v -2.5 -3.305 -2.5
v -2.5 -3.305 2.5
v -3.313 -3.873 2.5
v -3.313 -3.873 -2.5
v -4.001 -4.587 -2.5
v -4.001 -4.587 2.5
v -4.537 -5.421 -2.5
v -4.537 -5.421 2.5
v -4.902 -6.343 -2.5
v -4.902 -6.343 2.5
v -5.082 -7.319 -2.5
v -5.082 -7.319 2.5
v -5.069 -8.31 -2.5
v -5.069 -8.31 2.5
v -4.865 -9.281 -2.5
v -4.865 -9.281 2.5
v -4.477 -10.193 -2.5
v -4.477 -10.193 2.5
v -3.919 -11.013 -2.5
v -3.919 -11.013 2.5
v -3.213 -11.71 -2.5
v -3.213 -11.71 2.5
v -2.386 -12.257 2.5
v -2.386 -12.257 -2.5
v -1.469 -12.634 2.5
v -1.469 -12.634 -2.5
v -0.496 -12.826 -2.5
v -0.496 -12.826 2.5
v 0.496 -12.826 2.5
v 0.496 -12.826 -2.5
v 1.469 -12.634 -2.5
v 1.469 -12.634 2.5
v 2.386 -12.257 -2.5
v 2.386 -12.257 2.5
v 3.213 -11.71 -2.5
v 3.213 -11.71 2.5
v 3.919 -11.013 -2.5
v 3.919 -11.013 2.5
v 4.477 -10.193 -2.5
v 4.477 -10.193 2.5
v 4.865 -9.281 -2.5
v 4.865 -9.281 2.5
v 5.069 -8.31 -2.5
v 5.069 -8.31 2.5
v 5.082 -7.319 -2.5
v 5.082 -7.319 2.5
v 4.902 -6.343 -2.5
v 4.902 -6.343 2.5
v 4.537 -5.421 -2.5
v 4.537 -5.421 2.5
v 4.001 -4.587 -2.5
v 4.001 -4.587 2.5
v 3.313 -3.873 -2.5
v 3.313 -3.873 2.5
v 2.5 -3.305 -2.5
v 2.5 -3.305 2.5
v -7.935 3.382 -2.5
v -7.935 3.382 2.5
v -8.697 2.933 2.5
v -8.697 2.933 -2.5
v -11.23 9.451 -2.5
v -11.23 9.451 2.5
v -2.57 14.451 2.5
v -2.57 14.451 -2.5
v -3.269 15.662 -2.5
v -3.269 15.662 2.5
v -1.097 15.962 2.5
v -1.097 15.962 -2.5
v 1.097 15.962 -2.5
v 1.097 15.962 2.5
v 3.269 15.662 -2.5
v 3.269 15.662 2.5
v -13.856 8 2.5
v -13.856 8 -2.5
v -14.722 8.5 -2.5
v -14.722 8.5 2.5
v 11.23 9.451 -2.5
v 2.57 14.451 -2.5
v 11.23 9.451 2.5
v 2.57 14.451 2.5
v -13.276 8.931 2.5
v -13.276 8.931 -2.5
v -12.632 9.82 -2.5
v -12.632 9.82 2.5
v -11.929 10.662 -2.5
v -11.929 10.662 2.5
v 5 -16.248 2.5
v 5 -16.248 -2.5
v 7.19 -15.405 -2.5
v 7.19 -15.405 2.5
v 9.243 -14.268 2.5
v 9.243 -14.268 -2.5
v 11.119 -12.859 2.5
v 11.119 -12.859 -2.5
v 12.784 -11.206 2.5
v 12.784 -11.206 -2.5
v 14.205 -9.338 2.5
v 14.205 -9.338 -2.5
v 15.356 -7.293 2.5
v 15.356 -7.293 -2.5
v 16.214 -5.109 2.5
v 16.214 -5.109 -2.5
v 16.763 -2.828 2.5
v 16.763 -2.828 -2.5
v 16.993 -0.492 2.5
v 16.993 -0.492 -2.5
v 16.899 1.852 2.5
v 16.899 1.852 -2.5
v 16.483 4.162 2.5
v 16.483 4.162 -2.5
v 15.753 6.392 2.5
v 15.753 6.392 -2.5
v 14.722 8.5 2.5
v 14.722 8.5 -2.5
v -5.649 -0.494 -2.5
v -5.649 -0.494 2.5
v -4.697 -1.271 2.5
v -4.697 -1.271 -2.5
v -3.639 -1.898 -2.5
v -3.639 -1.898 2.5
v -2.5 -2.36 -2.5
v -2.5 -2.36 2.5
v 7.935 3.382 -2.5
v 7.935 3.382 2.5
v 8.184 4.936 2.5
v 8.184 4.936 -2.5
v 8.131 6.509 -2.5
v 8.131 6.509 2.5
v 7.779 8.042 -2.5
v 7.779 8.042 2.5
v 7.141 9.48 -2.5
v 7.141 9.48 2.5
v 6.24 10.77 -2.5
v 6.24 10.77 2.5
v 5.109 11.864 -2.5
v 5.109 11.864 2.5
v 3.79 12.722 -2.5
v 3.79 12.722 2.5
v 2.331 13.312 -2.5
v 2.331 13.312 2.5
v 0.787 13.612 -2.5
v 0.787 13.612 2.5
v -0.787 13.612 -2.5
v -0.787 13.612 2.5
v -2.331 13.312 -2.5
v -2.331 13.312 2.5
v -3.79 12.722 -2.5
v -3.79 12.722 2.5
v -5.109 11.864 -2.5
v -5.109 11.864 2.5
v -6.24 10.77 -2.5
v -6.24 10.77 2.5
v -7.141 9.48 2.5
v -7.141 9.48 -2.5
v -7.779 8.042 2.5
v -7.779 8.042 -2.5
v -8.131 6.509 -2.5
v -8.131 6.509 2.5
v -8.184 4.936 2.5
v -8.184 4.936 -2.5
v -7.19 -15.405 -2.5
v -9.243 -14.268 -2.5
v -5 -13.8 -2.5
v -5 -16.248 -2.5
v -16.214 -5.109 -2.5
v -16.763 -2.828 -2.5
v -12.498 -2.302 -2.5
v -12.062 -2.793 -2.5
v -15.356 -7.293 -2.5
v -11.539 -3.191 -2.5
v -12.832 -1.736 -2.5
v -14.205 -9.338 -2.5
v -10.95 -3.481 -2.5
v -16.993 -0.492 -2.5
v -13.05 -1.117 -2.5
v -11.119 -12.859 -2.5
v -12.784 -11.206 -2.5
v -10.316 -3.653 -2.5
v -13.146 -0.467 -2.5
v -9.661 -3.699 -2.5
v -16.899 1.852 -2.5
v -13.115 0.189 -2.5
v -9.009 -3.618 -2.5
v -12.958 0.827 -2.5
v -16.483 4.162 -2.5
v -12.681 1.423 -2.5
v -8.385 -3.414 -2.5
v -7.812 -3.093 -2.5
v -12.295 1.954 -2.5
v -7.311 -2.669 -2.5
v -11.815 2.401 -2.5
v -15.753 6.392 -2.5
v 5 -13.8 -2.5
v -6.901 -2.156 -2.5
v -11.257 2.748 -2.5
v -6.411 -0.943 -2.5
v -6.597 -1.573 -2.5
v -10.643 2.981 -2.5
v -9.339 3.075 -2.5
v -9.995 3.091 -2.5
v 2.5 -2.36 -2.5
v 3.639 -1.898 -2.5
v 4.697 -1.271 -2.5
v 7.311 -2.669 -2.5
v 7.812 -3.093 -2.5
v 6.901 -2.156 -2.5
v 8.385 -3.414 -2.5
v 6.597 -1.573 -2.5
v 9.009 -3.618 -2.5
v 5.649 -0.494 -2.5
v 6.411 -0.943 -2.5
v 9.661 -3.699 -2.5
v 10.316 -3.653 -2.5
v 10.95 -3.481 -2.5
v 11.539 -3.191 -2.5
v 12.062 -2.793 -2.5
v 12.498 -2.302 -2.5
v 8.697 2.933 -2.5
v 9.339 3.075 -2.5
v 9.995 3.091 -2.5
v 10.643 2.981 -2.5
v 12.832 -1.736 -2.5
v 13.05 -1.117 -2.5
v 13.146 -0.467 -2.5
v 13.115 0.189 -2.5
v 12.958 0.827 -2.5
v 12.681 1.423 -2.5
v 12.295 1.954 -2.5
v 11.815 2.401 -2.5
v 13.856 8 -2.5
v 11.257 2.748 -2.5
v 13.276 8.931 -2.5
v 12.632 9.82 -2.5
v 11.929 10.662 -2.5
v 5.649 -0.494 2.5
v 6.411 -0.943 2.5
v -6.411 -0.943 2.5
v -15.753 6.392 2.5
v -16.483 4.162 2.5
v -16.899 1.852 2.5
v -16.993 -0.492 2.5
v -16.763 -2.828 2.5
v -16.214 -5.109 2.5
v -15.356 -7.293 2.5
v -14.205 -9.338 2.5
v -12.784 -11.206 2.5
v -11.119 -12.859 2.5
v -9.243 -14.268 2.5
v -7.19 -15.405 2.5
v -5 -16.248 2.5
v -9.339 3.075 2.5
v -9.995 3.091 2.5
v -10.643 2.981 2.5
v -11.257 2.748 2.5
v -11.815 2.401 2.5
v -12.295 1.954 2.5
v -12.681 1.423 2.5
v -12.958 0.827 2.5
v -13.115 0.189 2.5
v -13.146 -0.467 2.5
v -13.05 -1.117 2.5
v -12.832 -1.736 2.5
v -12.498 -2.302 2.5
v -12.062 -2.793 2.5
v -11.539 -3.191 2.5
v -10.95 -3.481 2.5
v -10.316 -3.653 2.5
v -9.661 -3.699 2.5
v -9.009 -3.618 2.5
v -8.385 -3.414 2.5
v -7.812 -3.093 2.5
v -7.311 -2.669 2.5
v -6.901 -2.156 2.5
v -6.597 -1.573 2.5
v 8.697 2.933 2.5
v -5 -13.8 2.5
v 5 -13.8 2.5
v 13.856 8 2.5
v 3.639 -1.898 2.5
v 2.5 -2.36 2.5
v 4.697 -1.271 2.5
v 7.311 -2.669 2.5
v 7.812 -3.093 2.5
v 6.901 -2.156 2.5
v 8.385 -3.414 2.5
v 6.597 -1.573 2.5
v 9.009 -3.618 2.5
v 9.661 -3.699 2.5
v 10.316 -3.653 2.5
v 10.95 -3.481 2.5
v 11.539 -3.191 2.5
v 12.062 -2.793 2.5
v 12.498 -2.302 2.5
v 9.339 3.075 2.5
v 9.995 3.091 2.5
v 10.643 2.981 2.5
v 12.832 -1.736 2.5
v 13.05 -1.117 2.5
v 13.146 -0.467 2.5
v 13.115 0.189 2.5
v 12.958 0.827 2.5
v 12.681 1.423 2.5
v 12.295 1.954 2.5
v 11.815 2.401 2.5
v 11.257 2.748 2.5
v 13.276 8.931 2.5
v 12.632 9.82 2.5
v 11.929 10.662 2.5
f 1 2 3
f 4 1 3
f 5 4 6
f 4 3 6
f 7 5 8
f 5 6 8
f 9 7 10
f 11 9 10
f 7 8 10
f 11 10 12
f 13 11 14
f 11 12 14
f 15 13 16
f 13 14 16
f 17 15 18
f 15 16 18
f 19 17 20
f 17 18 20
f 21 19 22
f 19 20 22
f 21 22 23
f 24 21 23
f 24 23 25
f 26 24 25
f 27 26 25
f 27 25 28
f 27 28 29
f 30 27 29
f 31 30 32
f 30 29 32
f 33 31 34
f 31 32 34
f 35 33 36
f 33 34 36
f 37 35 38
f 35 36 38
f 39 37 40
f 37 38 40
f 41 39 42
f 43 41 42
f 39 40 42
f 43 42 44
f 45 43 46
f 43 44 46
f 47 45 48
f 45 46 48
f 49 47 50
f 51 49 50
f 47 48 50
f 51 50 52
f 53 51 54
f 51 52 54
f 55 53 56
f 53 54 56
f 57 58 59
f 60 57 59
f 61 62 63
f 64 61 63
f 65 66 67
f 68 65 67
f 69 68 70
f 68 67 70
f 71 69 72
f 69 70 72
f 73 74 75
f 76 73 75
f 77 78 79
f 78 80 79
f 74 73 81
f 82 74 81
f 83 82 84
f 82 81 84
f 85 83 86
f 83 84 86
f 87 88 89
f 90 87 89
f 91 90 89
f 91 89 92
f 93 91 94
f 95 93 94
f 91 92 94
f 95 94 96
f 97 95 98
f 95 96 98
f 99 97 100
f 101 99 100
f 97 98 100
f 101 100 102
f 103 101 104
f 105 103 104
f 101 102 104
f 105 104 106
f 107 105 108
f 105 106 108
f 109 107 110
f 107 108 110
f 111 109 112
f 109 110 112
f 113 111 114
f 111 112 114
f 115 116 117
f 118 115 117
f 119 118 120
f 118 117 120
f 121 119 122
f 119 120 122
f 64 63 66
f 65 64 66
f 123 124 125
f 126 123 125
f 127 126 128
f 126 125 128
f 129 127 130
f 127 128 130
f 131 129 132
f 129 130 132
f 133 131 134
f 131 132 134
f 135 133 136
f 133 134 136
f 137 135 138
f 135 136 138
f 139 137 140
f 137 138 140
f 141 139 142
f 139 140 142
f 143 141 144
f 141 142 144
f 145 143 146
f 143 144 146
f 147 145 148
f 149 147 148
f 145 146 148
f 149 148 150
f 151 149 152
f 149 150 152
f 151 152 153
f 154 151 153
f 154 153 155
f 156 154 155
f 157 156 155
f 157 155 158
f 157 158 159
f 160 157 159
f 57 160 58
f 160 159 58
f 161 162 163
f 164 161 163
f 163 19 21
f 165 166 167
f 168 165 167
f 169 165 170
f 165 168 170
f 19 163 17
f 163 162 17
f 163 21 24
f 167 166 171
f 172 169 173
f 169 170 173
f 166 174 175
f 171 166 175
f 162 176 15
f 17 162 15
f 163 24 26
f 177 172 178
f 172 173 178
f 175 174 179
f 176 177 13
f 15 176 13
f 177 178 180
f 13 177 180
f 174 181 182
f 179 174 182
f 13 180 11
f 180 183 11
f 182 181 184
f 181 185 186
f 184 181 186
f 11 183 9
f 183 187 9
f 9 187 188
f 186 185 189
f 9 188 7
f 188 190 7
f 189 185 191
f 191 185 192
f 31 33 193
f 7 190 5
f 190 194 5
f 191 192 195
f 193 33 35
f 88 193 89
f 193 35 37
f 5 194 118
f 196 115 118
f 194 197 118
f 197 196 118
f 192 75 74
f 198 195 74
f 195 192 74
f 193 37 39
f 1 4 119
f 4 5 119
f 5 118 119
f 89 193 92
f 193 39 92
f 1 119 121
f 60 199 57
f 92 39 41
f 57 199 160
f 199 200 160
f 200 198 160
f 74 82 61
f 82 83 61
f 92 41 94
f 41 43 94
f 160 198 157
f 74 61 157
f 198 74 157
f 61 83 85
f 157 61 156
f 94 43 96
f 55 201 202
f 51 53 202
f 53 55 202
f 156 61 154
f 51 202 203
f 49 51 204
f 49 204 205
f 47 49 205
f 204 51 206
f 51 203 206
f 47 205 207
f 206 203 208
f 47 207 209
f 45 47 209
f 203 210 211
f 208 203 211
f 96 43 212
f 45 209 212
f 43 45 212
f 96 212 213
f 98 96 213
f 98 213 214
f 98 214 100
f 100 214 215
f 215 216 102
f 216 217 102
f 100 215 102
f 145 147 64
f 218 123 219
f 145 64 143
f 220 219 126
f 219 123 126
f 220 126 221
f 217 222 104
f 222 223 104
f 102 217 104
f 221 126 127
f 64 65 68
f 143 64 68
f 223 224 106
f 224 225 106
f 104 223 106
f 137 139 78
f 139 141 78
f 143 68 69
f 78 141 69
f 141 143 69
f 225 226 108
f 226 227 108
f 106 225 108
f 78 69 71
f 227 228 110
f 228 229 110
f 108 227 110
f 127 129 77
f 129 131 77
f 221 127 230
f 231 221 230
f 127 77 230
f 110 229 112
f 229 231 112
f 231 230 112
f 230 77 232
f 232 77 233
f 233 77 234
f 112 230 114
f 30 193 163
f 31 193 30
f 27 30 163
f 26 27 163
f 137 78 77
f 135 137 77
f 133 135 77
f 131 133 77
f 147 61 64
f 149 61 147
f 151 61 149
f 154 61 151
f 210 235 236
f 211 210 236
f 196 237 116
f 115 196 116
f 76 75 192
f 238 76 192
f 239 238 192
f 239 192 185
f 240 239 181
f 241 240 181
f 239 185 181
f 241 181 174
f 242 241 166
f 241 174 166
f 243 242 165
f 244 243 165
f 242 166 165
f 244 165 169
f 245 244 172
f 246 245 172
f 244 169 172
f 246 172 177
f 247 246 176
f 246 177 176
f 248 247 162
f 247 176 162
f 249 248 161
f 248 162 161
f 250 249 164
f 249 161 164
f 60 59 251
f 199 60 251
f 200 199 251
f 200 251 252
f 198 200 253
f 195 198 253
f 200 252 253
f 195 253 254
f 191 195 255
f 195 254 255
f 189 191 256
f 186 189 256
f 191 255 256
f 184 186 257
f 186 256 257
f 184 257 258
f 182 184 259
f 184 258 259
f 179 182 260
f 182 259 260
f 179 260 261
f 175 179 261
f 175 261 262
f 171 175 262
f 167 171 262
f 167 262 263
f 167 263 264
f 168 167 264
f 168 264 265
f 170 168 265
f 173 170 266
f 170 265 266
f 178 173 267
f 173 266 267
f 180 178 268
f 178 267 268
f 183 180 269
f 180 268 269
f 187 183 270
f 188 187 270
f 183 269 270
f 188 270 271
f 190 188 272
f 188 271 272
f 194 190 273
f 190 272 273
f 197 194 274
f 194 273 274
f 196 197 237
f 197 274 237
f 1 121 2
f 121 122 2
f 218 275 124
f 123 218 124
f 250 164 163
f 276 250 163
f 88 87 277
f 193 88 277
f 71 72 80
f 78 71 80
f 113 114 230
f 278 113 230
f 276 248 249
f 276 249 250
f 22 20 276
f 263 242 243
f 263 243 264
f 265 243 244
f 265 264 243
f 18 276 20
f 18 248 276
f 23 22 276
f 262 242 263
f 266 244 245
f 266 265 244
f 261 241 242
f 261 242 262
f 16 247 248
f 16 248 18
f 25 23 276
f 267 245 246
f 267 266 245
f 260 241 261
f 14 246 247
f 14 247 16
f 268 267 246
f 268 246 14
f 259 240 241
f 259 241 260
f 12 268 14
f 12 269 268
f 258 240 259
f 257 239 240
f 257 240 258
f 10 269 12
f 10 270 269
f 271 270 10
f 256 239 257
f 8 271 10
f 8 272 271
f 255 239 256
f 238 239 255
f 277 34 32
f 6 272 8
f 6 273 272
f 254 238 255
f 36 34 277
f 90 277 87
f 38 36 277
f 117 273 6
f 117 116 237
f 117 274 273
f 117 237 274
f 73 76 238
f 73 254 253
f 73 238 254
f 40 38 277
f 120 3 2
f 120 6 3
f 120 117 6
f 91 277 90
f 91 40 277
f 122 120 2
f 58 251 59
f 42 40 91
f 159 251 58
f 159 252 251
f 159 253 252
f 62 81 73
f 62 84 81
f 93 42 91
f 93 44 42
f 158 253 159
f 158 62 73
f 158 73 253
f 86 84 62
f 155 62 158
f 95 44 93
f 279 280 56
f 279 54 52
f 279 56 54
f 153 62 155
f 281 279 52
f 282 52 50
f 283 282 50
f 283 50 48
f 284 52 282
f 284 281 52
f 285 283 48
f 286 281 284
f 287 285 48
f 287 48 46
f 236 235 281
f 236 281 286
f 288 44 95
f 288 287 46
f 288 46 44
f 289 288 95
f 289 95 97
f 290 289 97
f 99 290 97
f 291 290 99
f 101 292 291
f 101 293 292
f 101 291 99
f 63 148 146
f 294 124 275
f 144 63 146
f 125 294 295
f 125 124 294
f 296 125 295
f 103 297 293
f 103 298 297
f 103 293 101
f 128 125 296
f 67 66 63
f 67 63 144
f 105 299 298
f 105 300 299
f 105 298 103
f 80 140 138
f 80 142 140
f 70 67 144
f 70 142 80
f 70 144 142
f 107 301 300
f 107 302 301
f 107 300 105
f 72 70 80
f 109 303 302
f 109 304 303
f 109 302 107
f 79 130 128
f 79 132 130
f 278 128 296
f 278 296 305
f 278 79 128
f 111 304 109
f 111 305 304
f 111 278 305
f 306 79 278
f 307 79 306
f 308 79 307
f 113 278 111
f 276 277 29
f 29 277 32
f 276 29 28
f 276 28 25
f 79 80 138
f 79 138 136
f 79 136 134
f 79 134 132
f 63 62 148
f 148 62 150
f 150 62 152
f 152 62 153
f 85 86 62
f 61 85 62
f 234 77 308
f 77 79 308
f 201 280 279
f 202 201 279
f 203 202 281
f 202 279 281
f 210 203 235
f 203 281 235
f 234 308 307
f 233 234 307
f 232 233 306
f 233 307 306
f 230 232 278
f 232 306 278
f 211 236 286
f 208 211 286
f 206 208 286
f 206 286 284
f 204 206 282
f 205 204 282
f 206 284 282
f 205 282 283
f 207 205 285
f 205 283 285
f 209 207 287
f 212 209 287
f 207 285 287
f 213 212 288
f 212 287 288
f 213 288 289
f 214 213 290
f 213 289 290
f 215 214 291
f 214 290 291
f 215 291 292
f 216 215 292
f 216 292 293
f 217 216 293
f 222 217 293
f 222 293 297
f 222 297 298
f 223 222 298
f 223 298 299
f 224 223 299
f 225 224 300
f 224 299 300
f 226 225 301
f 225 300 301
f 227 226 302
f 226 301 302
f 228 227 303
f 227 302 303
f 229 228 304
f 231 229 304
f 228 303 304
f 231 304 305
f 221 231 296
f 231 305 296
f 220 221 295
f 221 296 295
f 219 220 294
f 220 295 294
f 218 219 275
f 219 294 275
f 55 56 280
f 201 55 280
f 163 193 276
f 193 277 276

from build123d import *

# Parameters (mm, degrees)
EXTRUDE_1_DEPTH     = 2.5
BOSS_EXTRUDE3_START = -2.5
BOSS_EXTRUDE3_DEPTH = 5


with BuildPart() as part:
    # Эскиз1 → Бобышка-Вытянуть1 (new, symmetric)
    with BuildSketch(Plane.XY):
        with BuildLine():
            Line((3.269215058, 15.662446581), (2.569872981, 14.451150572))
            Line((2.569872981, 14.451150572), (11.230127019, 9.451150572))
            Line((11.230127019, 9.451150572), (11.929469096, 10.662446581))
            ThreePointArc((11.929469096, 10.662446581), (15.454813221, -4.141104722), (5, -15.198684154))
            Line((5, -15.198684154), (5, -13.8))
            Line((5, -13.8), (0, -13.8))
            Line((0, -13.8), (-5, -13.8))
            Line((-5, -13.8), (-5, -15.198684154))
            ThreePointArc((-5, -15.198684154), (-15.454813221, -4.141104722), (-11.929469096, 10.662446581))
            Line((-11.929469096, 10.662446581), (-11.230127019, 9.451150572))
            Line((-11.230127019, 9.451150572), (-2.569872981, 14.451150572))
            Line((-2.569872981, 14.451150572), (-3.269215058, 15.662446581))
            ThreePointArc((-3.269215058, 15.662446581), (0, 16), (3.269215058, 15.662446581))
        make_face()
        with BuildLine():
            Line((-2.5, -2.359609465), (-2.5, -3.304777846))
            ThreePointArc((-2.5, -3.304777846), (0, -12.85), (2.5, -3.304777846))
            Line((2.5, -3.304777846), (2.5, -2.359609465))
            ThreePointArc((2.5, -2.359609465), (4.180016715, -1.604605606), (5.649137352, -0.493672869))
            Line((5.649137352, -0.493672869), (6.41139529, -0.943209602))
            ThreePointArc((6.41139529, -0.943209602), (12.678644072, -2.027149068), (8.69732788, 2.932936963))
            Line((8.69732788, 2.932936963), (7.935069942, 3.382473696))
            ThreePointArc((7.935069942, 3.382473696), (0, 13.65), (-7.935069942, 3.382473696))
            Line((-7.935069942, 3.382473696), (-8.69732788, 2.932936963))
            ThreePointArc((-8.69732788, 2.932936963), (-12.678644072, -2.027149068), (-6.41139529, -0.943209602))
            Line((-6.41139529, -0.943209602), (-5.649137352, -0.493672869))
            ThreePointArc((-5.649137352, -0.493672869), (-4.180016715, -1.604605606), (-2.5, -2.359609465))
        make_face(mode=Mode.SUBTRACT)
    extrude(amount=EXTRUDE_1_DEPTH, both=True)

    # Sketch2 → Boss-Extrude3 (add)
    with BuildSketch(Plane.XY.offset(BOSS_EXTRUDE3_START)):
        with BuildLine():
            ThreePointArc((-5, -15.198684154), (-14.947767484, -5.706509199), (-13.856406461, 8))
            Line((-13.856406461, 8), (-14.722431864, 8.5))
            ThreePointArc((-14.722431864, 8.5), (-15.822781238, -6.216075442), (-5, -16.248076809))
            Line((-5, -16.248076809), (-5, -15.198684154))
        make_face()
        with BuildLine():
            Line((14.722431864, 8.5), (13.856406461, 8))
            ThreePointArc((13.856406461, 8), (14.947767484, -5.706509199), (5, -15.198684154))
            Line((5, -15.198684154), (5, -16.248076809))
            ThreePointArc((5, -16.248076809), (15.822781238, -6.216075442), (14.722431864, 8.5))
        make_face()
    extrude(amount=BOSS_EXTRUDE3_DEPTH)


solid = part.part
